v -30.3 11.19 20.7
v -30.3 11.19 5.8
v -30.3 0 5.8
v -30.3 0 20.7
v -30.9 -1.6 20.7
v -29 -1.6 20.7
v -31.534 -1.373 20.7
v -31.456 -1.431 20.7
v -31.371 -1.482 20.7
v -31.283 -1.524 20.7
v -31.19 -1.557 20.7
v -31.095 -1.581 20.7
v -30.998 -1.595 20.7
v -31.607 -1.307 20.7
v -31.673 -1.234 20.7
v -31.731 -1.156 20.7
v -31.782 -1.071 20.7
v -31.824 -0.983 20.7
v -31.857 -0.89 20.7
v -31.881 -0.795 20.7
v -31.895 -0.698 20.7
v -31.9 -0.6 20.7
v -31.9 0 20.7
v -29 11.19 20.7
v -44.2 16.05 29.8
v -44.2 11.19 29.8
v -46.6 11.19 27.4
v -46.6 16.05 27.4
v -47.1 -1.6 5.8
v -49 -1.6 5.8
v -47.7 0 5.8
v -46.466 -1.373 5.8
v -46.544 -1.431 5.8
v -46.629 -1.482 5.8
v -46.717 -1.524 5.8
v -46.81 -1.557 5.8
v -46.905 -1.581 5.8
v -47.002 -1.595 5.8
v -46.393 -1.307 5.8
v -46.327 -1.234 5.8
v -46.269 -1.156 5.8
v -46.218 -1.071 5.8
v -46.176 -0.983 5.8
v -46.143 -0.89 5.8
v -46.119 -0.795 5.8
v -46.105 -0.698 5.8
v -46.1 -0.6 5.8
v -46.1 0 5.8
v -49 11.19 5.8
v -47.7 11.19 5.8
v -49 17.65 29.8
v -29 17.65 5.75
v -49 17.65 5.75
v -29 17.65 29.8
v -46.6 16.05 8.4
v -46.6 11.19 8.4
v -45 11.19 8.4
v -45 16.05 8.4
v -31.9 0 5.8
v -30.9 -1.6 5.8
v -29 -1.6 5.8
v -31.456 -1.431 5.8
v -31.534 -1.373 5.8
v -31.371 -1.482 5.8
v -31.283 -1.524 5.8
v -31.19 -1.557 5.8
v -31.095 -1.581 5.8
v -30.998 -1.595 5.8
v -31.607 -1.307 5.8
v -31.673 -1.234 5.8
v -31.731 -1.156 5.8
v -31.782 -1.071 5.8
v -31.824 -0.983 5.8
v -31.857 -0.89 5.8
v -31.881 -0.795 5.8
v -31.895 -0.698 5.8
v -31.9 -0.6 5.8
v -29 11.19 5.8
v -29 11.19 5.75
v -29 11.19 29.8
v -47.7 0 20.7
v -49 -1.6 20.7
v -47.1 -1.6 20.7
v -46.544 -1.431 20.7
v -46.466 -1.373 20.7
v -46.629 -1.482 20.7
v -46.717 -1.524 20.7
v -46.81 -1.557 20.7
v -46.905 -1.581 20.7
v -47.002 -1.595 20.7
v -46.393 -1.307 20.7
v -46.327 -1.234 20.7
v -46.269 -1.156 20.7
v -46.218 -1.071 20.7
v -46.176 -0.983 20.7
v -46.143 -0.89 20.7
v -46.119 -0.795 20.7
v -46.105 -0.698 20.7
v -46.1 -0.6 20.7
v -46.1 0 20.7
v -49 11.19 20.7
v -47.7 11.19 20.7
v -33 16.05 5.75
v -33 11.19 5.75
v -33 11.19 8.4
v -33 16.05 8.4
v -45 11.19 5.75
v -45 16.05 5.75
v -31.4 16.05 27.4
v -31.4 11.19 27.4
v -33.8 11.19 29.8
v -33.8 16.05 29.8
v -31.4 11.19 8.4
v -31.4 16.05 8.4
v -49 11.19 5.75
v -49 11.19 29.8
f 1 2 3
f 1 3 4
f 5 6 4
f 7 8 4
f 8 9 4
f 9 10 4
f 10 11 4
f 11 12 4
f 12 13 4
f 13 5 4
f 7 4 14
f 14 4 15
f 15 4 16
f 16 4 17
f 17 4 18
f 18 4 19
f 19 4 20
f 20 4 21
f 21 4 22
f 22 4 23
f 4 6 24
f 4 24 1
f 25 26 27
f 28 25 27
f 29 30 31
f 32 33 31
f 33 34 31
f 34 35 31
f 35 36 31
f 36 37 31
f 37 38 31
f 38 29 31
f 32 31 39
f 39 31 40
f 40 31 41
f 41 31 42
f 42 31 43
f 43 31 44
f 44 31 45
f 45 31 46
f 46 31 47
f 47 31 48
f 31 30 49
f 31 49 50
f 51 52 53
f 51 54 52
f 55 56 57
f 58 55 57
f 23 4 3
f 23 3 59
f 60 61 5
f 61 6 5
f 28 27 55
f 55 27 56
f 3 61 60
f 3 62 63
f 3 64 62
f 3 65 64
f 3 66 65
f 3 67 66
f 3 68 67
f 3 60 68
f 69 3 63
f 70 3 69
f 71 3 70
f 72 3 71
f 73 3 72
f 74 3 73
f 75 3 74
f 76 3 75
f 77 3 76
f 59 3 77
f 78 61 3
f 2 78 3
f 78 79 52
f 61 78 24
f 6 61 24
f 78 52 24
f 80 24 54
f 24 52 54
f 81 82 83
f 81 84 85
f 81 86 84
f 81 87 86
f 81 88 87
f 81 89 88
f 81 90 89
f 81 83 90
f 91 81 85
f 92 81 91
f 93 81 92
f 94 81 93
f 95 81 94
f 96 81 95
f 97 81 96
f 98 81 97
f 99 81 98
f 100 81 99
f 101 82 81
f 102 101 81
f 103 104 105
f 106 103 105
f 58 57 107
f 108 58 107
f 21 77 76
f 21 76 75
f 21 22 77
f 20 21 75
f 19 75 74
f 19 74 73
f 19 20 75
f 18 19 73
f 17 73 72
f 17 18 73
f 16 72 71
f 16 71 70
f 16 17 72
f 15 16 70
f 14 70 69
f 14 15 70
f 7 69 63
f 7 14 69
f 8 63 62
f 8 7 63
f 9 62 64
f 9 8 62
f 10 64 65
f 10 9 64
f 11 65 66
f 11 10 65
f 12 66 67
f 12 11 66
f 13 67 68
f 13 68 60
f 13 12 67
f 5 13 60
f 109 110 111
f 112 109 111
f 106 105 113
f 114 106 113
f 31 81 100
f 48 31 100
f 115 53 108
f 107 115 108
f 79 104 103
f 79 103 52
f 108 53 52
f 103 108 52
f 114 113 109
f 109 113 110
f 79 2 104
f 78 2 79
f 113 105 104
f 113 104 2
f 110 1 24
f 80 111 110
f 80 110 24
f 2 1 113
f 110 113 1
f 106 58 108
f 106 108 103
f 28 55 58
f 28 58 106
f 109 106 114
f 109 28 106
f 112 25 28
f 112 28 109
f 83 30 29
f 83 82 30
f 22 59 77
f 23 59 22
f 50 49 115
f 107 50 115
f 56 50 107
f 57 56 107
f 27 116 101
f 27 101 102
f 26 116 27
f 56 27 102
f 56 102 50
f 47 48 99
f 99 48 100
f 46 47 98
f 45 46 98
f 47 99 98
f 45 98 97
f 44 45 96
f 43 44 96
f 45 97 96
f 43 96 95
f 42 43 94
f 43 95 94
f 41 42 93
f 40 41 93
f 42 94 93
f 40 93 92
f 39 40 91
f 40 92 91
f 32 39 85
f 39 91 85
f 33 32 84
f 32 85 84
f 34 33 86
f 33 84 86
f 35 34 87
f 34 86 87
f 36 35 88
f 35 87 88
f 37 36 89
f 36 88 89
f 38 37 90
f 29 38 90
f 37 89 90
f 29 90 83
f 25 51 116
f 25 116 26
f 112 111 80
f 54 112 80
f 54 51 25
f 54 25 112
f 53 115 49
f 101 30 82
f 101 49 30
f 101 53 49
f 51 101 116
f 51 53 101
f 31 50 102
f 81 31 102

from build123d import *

# Parameters (mm, degrees)
SKETCH021_W             = 20
SKETCH021_H             = 24.05
PAD010_DEPTH            = 6.46
POCKET008_DEPTH         = 4.86
SKETCH022_W             = 1.3
SKETCH022_H             = 14.9
PAD011_DEPTH            = 17.65
SKETCH023_W             = 2.9
SKETCH023_H             = 14.9
PAD012_DEPTH            = 1.6
FILLET017_R             = 1
BODY003_PLACEMENT_ANGLE = 90


with BuildPart() as part:
    # Sketch021 → Pad010 (new body)
    with BuildSketch(Plane.XY):
        with Locations((0, 12.025)):
            Rectangle(SKETCH021_W, SKETCH021_H)
    extrude(amount=PAD010_DEPTH)

    # Sketch020 (on Face6 of Pad010) → Pocket008 (cut)
    with BuildSketch(Plane.XY.offset(6.46)):
        Polygon((7.6, 2.65), (7.6, 21.65), (5.2, 24.05), (-5.2, 24.05), (-7.6, 21.65), (-7.6, 2.65), (-6, 2.65), (-6, 0), (6, 0), (6, 2.65), align=None)
    extrude(amount=-POCKET008_DEPTH, mode=Mode.SUBTRACT)

    # Sketch022 → Pad011 (join)
    with BuildSketch(Plane.XY):
        with Locations((-9.35, 7.5)):
            Rectangle(SKETCH022_W, SKETCH022_H)
    pad011 = extrude(amount=PAD011_DEPTH)

    # Sketch023 (on Face23 of Pad011) → Pad012 (join)
    with BuildSketch(Plane.XY.offset(17.65)):
        with Locations((-8.55, 7.5)):
            Rectangle(SKETCH023_W, SKETCH023_H)
    pad012 = extrude(amount=PAD012_DEPTH)

    # Mirrored004: Pad011, Pad012 across Sketch022 V_Axis
    add(pad011.mirror(Plane(origin=(0, 0, 0), x_dir=(0, 0, 1), z_dir=(1, 0, 0))))
    add(pad012.mirror(Plane(origin=(0, 0, 0), x_dir=(0, 0, 1), z_dir=(1, 0, 0))))

    # Fillet017
    fillet017_edges = [part.edges().sort_by_distance(p)[0] for p in [
        (7.1, 7.5, 19.25),
        (-7.1, 7.5, 19.25),
    ]]
    fillet(fillet017_edges, radius=FILLET017_R)


with BuildPart() as part_1:
    # Body003 placement: moved
    add(part.part.moved(Location((-39, 17.65, 5.75))).rotate(Axis((-39, 17.65, 5.75), (1, 0, 0)), BODY003_PLACEMENT_ANGLE))


solid = part_1.part
